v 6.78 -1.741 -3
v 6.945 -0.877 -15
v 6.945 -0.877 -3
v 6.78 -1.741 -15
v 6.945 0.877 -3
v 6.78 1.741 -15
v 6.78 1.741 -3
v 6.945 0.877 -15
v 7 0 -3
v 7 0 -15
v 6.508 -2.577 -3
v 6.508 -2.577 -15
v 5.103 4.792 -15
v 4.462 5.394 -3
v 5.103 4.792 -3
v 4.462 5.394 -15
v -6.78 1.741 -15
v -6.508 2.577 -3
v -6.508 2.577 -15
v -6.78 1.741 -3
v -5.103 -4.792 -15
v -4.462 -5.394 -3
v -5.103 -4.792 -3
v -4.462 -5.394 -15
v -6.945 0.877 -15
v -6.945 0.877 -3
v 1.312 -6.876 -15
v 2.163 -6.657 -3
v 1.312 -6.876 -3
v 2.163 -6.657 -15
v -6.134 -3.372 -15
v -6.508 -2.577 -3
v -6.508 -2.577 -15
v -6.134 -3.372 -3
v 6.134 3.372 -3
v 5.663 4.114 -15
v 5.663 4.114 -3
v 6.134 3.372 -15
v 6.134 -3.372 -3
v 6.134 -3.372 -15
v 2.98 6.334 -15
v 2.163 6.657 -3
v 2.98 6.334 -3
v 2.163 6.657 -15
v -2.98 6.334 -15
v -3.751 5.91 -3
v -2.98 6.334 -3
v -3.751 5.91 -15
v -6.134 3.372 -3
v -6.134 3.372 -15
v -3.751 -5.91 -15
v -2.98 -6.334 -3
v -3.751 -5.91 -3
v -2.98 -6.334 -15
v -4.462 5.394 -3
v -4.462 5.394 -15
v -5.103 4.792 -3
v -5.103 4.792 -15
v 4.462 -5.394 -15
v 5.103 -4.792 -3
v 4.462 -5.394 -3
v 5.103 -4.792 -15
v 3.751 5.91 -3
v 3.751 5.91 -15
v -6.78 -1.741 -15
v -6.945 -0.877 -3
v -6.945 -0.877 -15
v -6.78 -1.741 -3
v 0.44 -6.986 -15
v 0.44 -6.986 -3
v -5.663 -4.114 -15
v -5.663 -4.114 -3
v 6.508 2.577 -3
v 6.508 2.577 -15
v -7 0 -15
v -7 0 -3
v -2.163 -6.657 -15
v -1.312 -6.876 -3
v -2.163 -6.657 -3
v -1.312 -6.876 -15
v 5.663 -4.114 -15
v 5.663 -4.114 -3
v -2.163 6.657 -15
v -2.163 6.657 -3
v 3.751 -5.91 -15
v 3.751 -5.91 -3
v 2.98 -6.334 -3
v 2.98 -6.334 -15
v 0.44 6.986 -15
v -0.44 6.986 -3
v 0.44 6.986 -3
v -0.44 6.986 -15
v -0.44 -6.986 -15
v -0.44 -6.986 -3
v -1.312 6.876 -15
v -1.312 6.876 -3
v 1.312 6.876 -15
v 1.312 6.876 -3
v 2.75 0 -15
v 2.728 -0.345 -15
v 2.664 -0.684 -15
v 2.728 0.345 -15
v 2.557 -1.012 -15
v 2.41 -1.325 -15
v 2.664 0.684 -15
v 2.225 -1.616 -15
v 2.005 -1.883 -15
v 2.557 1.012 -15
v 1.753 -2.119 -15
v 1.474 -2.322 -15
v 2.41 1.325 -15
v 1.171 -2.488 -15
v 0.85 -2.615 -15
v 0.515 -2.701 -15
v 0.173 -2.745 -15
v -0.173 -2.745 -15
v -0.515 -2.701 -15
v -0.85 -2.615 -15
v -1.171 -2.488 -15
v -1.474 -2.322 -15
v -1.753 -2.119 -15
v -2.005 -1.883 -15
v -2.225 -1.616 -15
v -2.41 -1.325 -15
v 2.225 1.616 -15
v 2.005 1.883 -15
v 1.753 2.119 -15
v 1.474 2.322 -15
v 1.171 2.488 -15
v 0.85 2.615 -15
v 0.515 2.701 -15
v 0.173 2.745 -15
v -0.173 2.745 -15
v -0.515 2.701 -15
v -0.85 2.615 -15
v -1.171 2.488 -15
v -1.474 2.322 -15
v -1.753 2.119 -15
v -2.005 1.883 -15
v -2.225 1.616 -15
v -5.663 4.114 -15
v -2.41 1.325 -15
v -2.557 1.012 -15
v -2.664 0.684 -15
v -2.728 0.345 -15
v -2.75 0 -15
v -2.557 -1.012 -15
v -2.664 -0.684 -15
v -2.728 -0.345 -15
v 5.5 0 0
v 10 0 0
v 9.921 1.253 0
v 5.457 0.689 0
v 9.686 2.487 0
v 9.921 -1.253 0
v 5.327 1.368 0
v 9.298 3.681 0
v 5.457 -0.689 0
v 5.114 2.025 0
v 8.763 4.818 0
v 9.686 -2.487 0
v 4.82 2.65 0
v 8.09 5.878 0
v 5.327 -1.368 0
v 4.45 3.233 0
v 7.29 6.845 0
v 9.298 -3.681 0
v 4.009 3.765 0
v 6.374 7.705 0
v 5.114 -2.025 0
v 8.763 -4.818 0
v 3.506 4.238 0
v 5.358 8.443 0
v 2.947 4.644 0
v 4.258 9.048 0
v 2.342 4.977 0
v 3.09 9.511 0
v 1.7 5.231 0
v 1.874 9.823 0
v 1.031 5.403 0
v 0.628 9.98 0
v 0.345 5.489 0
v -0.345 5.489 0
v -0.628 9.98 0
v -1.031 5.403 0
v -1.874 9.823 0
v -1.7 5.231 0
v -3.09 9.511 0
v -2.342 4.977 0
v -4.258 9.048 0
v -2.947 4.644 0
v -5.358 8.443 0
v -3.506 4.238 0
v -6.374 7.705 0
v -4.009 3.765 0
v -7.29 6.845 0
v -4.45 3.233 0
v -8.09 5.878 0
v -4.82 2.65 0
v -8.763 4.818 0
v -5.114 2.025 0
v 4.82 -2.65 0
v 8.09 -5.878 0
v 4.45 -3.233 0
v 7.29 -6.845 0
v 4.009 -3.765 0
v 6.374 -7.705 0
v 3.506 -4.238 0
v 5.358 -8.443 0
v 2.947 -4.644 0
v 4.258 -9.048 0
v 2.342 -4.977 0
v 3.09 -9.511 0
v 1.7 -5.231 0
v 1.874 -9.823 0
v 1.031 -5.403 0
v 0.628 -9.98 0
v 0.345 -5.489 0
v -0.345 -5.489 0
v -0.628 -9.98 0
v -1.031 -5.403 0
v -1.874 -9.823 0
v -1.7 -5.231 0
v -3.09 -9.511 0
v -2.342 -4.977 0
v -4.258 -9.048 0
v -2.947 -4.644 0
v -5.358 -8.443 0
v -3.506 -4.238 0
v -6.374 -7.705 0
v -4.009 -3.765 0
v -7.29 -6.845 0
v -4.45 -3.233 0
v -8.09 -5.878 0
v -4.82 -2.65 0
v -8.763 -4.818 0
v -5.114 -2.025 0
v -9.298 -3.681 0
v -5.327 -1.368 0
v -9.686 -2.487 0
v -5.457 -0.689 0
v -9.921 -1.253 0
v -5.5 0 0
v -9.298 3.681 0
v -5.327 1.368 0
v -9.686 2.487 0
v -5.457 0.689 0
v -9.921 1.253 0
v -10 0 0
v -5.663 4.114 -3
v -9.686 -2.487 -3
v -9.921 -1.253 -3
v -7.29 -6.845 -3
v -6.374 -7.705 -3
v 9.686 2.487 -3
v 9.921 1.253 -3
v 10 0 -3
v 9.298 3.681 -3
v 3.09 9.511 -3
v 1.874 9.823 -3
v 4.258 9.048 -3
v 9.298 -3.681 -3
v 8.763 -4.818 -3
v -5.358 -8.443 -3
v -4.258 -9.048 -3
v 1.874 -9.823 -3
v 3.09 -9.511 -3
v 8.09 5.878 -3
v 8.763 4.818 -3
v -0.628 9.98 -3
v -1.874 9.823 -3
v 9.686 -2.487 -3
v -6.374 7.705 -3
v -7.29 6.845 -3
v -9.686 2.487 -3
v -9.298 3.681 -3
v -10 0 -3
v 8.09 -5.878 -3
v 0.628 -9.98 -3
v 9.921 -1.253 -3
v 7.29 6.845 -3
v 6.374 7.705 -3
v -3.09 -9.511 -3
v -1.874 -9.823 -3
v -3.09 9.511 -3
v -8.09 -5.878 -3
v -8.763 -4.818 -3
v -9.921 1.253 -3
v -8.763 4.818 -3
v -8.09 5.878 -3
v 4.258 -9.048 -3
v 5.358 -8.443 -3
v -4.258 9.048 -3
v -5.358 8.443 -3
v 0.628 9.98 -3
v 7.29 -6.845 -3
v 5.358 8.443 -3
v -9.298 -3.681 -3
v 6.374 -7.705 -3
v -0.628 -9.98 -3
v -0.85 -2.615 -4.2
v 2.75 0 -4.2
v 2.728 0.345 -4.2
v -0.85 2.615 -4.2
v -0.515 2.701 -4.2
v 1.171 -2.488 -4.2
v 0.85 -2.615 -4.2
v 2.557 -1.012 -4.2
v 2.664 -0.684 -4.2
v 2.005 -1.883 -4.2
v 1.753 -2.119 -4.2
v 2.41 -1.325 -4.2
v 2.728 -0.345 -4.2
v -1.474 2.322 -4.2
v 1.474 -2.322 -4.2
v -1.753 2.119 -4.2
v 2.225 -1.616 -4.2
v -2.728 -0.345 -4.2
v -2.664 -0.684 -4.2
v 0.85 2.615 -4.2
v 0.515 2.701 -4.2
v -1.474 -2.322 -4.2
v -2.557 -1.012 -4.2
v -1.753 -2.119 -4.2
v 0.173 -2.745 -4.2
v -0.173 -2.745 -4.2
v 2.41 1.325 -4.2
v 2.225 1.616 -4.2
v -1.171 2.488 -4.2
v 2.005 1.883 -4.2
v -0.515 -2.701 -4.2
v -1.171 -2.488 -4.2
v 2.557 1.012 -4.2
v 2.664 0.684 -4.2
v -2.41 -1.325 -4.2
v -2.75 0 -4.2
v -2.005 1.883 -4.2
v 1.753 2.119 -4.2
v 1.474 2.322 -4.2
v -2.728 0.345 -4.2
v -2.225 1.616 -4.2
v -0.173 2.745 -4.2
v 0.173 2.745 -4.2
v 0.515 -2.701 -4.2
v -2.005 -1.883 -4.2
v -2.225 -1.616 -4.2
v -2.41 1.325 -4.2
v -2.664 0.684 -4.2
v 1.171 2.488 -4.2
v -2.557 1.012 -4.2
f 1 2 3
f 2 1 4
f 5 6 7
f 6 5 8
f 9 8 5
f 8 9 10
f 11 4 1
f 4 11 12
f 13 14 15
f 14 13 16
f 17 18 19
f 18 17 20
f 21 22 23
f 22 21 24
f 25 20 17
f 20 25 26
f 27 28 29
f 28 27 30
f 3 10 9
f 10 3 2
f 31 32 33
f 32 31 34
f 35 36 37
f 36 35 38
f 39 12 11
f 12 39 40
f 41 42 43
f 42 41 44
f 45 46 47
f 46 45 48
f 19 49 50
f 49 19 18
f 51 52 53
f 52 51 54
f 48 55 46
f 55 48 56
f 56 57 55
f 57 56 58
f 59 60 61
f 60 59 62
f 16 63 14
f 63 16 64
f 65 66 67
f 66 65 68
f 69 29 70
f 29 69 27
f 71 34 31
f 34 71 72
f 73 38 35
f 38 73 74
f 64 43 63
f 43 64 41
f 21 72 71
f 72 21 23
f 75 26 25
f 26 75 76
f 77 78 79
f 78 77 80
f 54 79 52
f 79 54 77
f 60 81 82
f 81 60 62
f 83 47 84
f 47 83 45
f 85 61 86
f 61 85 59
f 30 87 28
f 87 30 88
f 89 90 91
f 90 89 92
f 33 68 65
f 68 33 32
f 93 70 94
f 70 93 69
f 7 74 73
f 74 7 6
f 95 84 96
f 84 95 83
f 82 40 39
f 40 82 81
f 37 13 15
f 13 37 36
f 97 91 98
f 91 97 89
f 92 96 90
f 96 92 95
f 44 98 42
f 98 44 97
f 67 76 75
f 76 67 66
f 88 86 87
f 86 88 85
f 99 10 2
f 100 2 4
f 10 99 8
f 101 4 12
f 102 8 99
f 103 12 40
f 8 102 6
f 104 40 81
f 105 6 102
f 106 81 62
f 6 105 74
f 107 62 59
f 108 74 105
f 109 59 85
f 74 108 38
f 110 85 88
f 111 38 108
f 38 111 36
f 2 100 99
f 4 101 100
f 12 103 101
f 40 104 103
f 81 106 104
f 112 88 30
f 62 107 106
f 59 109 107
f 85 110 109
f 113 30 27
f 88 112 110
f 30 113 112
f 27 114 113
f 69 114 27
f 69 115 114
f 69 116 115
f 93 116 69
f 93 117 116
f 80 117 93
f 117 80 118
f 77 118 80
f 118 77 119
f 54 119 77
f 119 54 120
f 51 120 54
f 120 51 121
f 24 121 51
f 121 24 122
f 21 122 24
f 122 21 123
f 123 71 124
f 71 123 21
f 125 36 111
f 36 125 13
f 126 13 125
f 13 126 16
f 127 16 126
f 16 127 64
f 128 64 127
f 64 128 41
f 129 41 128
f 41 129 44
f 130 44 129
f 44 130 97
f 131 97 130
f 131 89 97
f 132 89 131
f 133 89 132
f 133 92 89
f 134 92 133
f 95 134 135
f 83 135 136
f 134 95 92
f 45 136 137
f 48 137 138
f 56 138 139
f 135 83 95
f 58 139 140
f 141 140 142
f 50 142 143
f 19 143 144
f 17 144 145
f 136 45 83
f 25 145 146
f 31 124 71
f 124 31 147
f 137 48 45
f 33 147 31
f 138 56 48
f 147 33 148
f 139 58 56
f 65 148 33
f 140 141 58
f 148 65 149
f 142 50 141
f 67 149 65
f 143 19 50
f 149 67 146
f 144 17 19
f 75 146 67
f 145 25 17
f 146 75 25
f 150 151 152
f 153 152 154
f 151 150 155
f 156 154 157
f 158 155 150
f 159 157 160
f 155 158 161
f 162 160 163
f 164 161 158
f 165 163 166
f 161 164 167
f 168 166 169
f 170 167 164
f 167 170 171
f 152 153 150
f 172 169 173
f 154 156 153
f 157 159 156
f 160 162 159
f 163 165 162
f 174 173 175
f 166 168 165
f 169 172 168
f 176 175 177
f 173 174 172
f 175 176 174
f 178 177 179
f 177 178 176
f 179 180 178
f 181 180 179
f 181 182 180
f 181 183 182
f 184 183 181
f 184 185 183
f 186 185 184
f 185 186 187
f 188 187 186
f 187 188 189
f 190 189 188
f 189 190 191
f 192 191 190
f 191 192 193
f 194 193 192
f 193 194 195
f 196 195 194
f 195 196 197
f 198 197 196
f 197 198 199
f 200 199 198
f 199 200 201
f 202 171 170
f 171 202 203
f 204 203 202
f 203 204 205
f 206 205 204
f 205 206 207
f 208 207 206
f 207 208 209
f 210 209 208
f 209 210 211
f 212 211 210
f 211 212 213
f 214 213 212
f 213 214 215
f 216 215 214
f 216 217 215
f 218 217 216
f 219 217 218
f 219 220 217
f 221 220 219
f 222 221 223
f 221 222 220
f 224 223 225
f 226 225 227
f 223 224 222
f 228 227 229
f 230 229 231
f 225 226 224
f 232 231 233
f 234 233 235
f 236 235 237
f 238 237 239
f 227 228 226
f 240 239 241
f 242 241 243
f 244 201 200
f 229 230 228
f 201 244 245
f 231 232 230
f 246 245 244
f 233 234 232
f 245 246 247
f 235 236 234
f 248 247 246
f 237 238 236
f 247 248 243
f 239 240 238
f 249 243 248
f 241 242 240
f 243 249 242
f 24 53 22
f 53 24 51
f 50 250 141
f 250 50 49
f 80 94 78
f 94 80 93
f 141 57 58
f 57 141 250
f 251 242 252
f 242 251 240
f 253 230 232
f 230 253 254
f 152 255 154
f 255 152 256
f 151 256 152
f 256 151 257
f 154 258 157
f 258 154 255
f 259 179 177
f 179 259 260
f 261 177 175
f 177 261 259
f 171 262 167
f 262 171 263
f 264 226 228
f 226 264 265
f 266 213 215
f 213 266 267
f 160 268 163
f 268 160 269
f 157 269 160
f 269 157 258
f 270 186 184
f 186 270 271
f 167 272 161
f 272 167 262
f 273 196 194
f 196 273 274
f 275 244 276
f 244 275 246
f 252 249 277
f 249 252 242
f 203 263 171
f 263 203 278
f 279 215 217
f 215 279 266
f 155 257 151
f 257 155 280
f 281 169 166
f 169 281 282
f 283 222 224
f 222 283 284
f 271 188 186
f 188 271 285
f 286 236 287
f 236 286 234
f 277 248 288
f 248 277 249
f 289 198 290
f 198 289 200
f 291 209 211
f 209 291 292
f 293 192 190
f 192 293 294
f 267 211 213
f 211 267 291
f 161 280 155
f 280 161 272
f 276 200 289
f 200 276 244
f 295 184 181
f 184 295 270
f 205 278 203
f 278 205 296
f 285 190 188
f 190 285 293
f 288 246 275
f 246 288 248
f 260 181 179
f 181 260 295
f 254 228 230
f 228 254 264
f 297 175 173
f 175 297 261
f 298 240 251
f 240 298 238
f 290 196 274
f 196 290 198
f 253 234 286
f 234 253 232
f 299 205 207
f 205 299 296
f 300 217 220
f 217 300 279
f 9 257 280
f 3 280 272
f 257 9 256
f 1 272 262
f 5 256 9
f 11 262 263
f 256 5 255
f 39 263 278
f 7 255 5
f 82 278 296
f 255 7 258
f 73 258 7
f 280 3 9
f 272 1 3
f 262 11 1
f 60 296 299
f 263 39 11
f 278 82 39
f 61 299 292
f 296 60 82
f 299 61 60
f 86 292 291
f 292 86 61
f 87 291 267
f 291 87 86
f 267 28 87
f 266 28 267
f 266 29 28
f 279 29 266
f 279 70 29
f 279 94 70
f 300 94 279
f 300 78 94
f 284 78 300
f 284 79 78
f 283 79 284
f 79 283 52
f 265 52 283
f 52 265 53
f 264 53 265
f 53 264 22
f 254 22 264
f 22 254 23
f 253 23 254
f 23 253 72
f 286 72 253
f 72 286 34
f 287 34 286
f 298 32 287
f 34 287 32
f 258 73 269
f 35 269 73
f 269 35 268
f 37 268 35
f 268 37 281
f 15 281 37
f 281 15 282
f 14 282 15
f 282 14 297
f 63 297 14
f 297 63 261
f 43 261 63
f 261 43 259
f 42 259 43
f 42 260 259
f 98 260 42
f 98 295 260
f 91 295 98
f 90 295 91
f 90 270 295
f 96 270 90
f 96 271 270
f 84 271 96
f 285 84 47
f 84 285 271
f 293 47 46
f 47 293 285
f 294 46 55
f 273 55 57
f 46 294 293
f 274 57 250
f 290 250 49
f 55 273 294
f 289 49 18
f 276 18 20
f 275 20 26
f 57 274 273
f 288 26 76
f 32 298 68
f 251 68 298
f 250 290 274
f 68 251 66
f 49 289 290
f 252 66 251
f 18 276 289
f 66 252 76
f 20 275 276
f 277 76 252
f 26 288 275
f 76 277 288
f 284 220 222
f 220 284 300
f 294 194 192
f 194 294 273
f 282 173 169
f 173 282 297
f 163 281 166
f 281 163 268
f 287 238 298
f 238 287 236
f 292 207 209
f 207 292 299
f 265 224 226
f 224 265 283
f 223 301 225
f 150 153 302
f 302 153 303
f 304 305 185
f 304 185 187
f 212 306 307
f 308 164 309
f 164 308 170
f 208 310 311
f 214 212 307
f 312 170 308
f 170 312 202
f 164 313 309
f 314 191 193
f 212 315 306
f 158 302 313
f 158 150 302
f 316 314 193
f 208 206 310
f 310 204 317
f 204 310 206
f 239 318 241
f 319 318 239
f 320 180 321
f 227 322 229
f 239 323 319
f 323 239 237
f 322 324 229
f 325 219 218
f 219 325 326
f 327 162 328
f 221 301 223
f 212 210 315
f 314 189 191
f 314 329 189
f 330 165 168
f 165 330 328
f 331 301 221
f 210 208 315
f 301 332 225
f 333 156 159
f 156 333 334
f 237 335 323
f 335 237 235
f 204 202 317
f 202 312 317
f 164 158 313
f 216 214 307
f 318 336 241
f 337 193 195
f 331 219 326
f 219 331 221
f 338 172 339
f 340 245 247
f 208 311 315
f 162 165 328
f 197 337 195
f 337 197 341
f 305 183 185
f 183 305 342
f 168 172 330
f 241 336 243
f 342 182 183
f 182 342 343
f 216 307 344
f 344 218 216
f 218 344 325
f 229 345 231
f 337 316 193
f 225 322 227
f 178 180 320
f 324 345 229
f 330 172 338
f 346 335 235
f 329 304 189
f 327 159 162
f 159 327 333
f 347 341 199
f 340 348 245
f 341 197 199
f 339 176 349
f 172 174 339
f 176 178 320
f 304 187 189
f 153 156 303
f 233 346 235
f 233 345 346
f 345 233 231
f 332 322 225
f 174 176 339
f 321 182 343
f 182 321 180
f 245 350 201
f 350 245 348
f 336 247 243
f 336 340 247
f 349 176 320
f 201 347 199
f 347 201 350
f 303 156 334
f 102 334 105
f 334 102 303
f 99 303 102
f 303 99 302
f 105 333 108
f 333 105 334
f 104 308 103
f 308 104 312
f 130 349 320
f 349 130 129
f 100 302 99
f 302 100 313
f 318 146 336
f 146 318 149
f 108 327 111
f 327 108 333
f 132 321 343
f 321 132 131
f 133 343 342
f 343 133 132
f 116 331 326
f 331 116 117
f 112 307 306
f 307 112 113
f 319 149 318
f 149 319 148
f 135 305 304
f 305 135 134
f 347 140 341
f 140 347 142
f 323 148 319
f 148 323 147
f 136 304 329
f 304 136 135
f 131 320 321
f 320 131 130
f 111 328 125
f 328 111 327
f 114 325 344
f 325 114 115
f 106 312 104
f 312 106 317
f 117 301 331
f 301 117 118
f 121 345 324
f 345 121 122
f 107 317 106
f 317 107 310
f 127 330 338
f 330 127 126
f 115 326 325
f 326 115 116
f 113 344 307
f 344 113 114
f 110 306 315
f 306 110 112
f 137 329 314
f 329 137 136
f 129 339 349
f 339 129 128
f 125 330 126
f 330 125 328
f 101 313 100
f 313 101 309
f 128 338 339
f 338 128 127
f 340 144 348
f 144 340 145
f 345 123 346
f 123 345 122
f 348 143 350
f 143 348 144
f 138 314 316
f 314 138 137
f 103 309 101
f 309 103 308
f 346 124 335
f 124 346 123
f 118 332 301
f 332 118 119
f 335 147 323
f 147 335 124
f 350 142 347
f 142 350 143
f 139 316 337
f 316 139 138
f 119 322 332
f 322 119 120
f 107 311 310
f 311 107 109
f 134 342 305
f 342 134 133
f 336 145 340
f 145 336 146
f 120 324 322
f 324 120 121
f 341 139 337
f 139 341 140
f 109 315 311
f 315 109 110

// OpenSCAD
$fn = 50;


difference() {
	union() {
		translate(v = [0, 0, -15.0000000000]) {
			cylinder(h = 15, r = 7.0000000000);
		}
		translate(v = [0, 0, -3.0000000000]) {
			cylinder(h = 3, r = 10.0000000000);
		}
	}
	union() {
		translate(v = [0, 0, 0]) {
			rotate(a = [0, 0, 0]) {
				difference() {
					union() {
						#translate(v = [0, 0, -15.0000000000]) {
							cylinder(h = 15, r = 2.2500000000);
						}
						#translate(v = [0, 0, -4.2000000000]) {
							cylinder(h = 4.2000000000, r1 = 2.7500000000, r2 = 5.5000000000);
						}
						#translate(v = [0, 0, -15.0000000000]) {
							cylinder(h = 15, r = 2.7500000000);
						}
						#translate(v = [0, 0, -15.0000000000]) {
							cylinder(h = 15, r = 2.2500000000);
						}
					}
					union();
				}
			}
		}
	}
}
